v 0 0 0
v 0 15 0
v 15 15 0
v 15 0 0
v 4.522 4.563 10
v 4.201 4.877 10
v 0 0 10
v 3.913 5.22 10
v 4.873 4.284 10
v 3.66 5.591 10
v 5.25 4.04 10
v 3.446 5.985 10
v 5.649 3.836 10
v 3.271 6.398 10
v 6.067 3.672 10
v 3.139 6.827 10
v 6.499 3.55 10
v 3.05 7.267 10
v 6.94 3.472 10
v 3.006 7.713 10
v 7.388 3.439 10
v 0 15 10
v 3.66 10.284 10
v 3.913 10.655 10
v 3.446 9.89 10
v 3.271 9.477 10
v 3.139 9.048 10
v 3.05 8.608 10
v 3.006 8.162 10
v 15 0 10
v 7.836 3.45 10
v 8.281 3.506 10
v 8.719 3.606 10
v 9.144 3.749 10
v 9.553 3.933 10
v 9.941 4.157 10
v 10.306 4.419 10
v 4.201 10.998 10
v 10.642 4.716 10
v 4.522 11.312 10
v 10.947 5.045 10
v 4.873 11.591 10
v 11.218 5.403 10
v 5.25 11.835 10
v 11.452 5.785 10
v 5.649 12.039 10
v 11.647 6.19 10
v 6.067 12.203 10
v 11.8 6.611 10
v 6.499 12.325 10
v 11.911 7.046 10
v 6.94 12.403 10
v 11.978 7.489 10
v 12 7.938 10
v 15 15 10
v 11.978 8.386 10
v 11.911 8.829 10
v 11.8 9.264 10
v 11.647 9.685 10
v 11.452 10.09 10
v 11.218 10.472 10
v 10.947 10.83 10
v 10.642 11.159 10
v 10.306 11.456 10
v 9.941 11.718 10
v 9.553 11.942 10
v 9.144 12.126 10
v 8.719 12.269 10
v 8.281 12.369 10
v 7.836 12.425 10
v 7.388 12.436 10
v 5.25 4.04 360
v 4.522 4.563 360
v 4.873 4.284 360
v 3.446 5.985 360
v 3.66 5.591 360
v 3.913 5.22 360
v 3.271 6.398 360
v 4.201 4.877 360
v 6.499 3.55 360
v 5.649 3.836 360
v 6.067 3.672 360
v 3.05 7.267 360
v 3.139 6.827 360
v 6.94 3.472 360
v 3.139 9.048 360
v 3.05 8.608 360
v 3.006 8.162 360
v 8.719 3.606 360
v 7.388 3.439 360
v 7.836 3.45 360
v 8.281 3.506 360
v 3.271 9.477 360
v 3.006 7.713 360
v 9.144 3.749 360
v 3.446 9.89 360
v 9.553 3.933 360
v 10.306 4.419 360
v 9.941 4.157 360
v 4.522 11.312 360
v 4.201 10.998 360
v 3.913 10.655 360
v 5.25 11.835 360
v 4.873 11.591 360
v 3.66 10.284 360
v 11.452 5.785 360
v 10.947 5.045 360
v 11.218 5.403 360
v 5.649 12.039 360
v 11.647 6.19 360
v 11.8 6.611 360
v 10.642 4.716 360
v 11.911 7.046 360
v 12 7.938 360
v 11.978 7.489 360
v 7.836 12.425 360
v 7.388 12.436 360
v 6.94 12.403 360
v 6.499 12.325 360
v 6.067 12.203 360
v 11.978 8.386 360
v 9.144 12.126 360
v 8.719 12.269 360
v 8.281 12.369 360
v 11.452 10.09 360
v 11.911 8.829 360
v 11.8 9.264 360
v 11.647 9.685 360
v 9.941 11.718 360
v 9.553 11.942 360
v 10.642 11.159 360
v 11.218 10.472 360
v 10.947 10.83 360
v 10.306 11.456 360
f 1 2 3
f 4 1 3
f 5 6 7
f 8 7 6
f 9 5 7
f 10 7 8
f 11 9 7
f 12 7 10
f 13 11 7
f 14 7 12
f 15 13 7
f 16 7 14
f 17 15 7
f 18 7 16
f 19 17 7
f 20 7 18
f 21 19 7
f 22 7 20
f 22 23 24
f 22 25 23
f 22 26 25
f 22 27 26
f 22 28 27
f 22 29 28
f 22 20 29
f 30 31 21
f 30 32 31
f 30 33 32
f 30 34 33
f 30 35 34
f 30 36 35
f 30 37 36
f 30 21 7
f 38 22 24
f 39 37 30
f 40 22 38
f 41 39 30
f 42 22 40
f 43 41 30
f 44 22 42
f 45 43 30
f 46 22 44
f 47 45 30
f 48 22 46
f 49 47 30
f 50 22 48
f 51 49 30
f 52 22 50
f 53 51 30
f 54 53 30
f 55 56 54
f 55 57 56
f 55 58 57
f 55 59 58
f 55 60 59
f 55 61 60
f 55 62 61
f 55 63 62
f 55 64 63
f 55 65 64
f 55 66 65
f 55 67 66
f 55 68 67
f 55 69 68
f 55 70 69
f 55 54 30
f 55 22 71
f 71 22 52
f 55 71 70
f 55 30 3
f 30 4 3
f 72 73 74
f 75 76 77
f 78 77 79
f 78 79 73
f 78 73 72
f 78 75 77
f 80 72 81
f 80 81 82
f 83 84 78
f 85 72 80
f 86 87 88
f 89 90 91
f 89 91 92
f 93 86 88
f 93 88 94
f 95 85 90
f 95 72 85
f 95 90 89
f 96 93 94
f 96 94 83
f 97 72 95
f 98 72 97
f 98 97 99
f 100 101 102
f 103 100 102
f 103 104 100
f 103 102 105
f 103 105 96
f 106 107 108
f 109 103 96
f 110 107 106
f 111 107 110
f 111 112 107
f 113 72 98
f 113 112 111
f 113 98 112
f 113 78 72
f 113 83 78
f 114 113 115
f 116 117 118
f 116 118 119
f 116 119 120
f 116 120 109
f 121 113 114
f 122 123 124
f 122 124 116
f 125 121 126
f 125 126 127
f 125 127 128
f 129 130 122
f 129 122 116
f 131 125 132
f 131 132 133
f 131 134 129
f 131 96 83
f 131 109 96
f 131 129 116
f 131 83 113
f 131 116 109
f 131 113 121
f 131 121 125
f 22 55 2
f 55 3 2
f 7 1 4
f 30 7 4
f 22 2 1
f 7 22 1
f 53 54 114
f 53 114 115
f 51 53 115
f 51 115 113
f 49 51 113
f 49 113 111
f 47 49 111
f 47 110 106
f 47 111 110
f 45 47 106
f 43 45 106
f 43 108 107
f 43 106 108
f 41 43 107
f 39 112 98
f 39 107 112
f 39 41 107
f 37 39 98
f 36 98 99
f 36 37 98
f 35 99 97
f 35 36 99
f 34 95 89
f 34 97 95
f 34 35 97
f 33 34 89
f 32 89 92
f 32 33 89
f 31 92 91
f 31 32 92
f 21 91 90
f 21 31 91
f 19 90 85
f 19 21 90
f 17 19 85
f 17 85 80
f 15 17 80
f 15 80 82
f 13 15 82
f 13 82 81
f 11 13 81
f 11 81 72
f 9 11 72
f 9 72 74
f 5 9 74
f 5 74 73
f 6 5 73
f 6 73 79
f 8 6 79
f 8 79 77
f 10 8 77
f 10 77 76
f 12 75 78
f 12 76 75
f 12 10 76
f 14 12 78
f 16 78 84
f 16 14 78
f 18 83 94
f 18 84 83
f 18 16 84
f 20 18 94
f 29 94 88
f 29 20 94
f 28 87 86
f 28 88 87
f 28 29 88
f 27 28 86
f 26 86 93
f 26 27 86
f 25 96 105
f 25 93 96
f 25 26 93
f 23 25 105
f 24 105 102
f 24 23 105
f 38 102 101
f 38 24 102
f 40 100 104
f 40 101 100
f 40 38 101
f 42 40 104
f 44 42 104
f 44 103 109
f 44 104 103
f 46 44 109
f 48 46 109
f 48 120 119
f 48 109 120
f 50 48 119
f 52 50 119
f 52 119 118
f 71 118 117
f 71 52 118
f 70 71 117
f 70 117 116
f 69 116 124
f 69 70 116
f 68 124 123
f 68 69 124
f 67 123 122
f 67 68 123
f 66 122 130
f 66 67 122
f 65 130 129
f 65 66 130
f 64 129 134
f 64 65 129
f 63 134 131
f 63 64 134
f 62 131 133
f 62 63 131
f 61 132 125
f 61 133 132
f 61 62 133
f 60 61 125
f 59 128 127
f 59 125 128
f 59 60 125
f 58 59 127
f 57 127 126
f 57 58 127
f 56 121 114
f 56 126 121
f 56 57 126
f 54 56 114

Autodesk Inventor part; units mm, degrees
ref_plane "YZ Plane" through (0, 0, 0) normal (1, 0, 0) x (0, 1, 0)
ref_plane "XZ Plane" through (0, 0, 0) normal (0, 1, 0) x (-1, 0, 0)
ref_plane "XY Plane" through (0, 0, 0) normal (0, 0, 1) x (1, 0, 0)
sketch "Sketch1" plane through (0, 0, 0) normal (0, 0, 1) x (1, 0, 0)
  line L0 (0, 0) -> (15, 0)
  line L1 (15, 0) -> (15, 15)
  line L2 (15, 15) -> (0, 15)
  line L3 (0, 15) -> (0, 0)
  dimension "d0" = 15
  dimension "d1" = 15
extrude "Extrusion1" add sketch "Sketch1" along normal blind 10
sketch "Sketch2" plane through (0, 0, 10) normal (0, 0, 1) x (1, 0, 0)
  line L0 (0, 15) -> (7.1003, 15)
  line L1 (15, 15) -> (0, 15) projected
  line L2 (7.5, 15) -> (7.5, 0)
  line L3 (0, 15) -> (7.9375, 15)
  line L4 (0, 0) -> (0, 7.9375)
  line L5 (0, 7.9375) -> (15, 7.9375)
  circle A0 centre (7.5, 7.9375) radius 4.5
  dimension "d15" = 9
extrude "Extrusion2" add sketch "Sketch2" along normal blind 250
thread "Thread1" size "M11x1.5" class "6g" standard "ANSI Metric M Profile" full length
ref_plane "Work Plane1" through (7.5, 7.9375, 260) normal (0, 0, 1) x (1, 0, 0)
sketch "Sketch3" plane through (7.5, 7.9375, 260) normal (0, 0, 1) x (1, 0, 0)
  circle A0 centre (0, 0) radius 5.5 projected
  circle A1 centre (0, 0) radius 4.5
  point P0 (-7.5, -7.9375)
  dimension "d10" = 9
extrude "Extrusion3" add sketch "Sketch3" along normal blind 100 contours A1
thread "Thread2" size "M9x1.25" class "6g" standard "ANSI Metric M Profile" full length
properties part number "SA"
